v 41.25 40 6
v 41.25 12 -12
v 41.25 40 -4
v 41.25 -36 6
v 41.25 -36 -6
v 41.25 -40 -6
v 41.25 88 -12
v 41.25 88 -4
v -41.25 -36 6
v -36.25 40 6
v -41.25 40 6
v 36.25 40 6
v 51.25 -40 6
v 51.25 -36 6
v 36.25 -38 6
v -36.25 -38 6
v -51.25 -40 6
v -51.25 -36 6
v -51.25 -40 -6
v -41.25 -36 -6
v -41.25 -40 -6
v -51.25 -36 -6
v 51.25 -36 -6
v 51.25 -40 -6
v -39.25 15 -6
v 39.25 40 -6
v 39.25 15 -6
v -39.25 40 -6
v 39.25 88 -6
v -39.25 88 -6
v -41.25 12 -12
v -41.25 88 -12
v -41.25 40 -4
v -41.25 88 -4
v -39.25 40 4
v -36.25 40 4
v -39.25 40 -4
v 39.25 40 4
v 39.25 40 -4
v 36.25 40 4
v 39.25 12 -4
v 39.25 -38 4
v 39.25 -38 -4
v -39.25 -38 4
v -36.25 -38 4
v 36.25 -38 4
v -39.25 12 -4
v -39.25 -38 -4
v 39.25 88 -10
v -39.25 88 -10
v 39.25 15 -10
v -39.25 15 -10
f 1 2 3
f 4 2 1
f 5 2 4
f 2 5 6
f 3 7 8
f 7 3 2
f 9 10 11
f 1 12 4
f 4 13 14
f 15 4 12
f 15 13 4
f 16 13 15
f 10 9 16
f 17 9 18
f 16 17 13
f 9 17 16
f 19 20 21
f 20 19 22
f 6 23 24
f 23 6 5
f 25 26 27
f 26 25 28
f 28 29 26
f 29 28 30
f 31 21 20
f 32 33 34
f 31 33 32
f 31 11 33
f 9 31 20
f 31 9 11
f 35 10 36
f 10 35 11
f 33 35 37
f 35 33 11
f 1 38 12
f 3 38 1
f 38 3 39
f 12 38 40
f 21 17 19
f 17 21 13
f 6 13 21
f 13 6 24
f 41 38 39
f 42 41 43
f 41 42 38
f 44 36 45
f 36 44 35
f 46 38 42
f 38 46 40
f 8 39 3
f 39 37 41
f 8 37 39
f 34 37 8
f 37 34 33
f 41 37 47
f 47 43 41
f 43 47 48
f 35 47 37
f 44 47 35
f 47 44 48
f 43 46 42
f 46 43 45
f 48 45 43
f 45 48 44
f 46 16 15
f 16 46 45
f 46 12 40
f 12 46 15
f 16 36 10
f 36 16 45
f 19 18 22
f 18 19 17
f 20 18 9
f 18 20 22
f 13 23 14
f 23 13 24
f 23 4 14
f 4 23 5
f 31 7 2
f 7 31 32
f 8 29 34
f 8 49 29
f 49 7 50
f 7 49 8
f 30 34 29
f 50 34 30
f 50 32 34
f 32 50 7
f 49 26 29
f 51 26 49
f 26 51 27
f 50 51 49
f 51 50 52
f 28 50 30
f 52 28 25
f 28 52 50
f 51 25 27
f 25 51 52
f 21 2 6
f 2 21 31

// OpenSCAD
use <MCAD/boxes.scad>

IPHONE_8_PLUS_WIDTH = 78.5;
IPHONE_8_PLUS_DEPTH = 8;
IPHONE_8_PLUS_SIDE_BEZZLE = 3;

LIGHTNING_CABLE_WIDTH = 10;

HOLDER_HEIGHT = 80;

module prism(l, w, h){
    polyhedron(
            points=[[0,0,0], [l,0,0], [l,w,0], [0,w,0], [0,w,h], [l,w,h]],
            faces=[[0,1,2,3],[5,4,3,2],[0,4,5,1],[0,3,4],[5,2,1]]
            );
    
    // preview unfolded (do not include in your function
    // z = 0.08;
    // separation = 2;
    // border = .2;
    // translate([0,w+separation,0])
    //     cube([l,w,z]);
    // translate([0,w+separation+w+border,0])
    //     cube([l,h,z]);
    // translate([0,w+separation+w+border+h+border,0])
    //     cube([l,sqrt(w*w+h*h),z]);
    // translate([l+border,w+separation+w+border+h+border,0])
    //     polyhedron(
    //             points=[[0,0,0],[h,0,0],[0,sqrt(w*w+h*h),0], [0,0,z],[h,0,z],[0,sqrt(w*w+h*h),z]],
    //             faces=[[0,1,2], [3,5,4], [0,3,4,1], [1,4,5,2], [2,5,3,0]]
    //             );
    // translate([0-border,w+separation+w+border+h+border,0])
    //     polyhedron(
    //             points=[[0,0,0],[0-h,0,0],[0,sqrt(w*w+h*h),0], [0,0,z],[0-h,0,z],[0,sqrt(w*w+h*h),z]],
    //             faces=[[1,0,2],[5,3,4],[0,1,4,3],[1,2,5,4],[2,0,3,5]]
    //             );
}

module cradle() {
    difference() {
        cube([IPHONE_8_PLUS_WIDTH + 4, HOLDER_HEIGHT, IPHONE_8_PLUS_DEPTH + 4], center=true);

        translate([0, 2, 0]) {
            cube([IPHONE_8_PLUS_WIDTH, HOLDER_HEIGHT, IPHONE_8_PLUS_DEPTH], center=true);
        }

        translate([0, 2, 4]) {
            cube([IPHONE_8_PLUS_WIDTH - IPHONE_8_PLUS_SIDE_BEZZLE*2, HOLDER_HEIGHT, IPHONE_8_PLUS_DEPTH], center=true);
        }
    }

    translate([-IPHONE_8_PLUS_WIDTH/2 - 7, -HOLDER_HEIGHT/2 + 2, 0]) {
        cube([10, 4, IPHONE_8_PLUS_DEPTH + 4], center=true);
    }

    mirror([1, 0, 0]) {
        translate([-IPHONE_8_PLUS_WIDTH/2 - 7, -HOLDER_HEIGHT/2 + 2, 0]) {
            cube([10, 4, IPHONE_8_PLUS_DEPTH + 4], center=true);
        }
    }
}

cradle();
translate([0, HOLDER_HEIGHT/2 + 76/2 - 28, -8]) {
    difference() {
        cube([IPHONE_8_PLUS_WIDTH + 4, 76, 8], center=true);
        translate([0, 2, 0]) {
            cube([IPHONE_8_PLUS_WIDTH + 4 - 4, 76 - 2, 8 - 4], center=true);
        }
    }
}

translate([-IPHONE_8_PLUS_WIDTH/2 -2, -HOLDER_HEIGHT/2, -6]) {
    mirror([0, 0, -1]) {
        prism(IPHONE_8_PLUS_WIDTH + 4, HOLDER_HEIGHT - 28, 6);
    }
}

// rotate([-7, 0, 0]) {
//     cradle();
// }

$fn = 32;

// difference() {
//     translate([-IPHONE_8_PLUS_WIDTH/2 - 8, -HOLDER_HEIGHT/2 + 3, 0]) {
//         roundedBox([10, 10, 50], 1, false);
//     }
//     rotate([-7, 0, 0]) {
//         cradle();
//     }
// }

// mirror([1, 0, 0]) {
//     difference() {
//         translate([-IPHONE_8_PLUS_WIDTH/2 - 8, -HOLDER_HEIGHT/2 + 3, 0]) {
//             roundedBox([10, 10, 50], 1, false);
//         }
//         rotate([-7, 0, 0]) {
//             cradle();
//         }
//     }
// }
